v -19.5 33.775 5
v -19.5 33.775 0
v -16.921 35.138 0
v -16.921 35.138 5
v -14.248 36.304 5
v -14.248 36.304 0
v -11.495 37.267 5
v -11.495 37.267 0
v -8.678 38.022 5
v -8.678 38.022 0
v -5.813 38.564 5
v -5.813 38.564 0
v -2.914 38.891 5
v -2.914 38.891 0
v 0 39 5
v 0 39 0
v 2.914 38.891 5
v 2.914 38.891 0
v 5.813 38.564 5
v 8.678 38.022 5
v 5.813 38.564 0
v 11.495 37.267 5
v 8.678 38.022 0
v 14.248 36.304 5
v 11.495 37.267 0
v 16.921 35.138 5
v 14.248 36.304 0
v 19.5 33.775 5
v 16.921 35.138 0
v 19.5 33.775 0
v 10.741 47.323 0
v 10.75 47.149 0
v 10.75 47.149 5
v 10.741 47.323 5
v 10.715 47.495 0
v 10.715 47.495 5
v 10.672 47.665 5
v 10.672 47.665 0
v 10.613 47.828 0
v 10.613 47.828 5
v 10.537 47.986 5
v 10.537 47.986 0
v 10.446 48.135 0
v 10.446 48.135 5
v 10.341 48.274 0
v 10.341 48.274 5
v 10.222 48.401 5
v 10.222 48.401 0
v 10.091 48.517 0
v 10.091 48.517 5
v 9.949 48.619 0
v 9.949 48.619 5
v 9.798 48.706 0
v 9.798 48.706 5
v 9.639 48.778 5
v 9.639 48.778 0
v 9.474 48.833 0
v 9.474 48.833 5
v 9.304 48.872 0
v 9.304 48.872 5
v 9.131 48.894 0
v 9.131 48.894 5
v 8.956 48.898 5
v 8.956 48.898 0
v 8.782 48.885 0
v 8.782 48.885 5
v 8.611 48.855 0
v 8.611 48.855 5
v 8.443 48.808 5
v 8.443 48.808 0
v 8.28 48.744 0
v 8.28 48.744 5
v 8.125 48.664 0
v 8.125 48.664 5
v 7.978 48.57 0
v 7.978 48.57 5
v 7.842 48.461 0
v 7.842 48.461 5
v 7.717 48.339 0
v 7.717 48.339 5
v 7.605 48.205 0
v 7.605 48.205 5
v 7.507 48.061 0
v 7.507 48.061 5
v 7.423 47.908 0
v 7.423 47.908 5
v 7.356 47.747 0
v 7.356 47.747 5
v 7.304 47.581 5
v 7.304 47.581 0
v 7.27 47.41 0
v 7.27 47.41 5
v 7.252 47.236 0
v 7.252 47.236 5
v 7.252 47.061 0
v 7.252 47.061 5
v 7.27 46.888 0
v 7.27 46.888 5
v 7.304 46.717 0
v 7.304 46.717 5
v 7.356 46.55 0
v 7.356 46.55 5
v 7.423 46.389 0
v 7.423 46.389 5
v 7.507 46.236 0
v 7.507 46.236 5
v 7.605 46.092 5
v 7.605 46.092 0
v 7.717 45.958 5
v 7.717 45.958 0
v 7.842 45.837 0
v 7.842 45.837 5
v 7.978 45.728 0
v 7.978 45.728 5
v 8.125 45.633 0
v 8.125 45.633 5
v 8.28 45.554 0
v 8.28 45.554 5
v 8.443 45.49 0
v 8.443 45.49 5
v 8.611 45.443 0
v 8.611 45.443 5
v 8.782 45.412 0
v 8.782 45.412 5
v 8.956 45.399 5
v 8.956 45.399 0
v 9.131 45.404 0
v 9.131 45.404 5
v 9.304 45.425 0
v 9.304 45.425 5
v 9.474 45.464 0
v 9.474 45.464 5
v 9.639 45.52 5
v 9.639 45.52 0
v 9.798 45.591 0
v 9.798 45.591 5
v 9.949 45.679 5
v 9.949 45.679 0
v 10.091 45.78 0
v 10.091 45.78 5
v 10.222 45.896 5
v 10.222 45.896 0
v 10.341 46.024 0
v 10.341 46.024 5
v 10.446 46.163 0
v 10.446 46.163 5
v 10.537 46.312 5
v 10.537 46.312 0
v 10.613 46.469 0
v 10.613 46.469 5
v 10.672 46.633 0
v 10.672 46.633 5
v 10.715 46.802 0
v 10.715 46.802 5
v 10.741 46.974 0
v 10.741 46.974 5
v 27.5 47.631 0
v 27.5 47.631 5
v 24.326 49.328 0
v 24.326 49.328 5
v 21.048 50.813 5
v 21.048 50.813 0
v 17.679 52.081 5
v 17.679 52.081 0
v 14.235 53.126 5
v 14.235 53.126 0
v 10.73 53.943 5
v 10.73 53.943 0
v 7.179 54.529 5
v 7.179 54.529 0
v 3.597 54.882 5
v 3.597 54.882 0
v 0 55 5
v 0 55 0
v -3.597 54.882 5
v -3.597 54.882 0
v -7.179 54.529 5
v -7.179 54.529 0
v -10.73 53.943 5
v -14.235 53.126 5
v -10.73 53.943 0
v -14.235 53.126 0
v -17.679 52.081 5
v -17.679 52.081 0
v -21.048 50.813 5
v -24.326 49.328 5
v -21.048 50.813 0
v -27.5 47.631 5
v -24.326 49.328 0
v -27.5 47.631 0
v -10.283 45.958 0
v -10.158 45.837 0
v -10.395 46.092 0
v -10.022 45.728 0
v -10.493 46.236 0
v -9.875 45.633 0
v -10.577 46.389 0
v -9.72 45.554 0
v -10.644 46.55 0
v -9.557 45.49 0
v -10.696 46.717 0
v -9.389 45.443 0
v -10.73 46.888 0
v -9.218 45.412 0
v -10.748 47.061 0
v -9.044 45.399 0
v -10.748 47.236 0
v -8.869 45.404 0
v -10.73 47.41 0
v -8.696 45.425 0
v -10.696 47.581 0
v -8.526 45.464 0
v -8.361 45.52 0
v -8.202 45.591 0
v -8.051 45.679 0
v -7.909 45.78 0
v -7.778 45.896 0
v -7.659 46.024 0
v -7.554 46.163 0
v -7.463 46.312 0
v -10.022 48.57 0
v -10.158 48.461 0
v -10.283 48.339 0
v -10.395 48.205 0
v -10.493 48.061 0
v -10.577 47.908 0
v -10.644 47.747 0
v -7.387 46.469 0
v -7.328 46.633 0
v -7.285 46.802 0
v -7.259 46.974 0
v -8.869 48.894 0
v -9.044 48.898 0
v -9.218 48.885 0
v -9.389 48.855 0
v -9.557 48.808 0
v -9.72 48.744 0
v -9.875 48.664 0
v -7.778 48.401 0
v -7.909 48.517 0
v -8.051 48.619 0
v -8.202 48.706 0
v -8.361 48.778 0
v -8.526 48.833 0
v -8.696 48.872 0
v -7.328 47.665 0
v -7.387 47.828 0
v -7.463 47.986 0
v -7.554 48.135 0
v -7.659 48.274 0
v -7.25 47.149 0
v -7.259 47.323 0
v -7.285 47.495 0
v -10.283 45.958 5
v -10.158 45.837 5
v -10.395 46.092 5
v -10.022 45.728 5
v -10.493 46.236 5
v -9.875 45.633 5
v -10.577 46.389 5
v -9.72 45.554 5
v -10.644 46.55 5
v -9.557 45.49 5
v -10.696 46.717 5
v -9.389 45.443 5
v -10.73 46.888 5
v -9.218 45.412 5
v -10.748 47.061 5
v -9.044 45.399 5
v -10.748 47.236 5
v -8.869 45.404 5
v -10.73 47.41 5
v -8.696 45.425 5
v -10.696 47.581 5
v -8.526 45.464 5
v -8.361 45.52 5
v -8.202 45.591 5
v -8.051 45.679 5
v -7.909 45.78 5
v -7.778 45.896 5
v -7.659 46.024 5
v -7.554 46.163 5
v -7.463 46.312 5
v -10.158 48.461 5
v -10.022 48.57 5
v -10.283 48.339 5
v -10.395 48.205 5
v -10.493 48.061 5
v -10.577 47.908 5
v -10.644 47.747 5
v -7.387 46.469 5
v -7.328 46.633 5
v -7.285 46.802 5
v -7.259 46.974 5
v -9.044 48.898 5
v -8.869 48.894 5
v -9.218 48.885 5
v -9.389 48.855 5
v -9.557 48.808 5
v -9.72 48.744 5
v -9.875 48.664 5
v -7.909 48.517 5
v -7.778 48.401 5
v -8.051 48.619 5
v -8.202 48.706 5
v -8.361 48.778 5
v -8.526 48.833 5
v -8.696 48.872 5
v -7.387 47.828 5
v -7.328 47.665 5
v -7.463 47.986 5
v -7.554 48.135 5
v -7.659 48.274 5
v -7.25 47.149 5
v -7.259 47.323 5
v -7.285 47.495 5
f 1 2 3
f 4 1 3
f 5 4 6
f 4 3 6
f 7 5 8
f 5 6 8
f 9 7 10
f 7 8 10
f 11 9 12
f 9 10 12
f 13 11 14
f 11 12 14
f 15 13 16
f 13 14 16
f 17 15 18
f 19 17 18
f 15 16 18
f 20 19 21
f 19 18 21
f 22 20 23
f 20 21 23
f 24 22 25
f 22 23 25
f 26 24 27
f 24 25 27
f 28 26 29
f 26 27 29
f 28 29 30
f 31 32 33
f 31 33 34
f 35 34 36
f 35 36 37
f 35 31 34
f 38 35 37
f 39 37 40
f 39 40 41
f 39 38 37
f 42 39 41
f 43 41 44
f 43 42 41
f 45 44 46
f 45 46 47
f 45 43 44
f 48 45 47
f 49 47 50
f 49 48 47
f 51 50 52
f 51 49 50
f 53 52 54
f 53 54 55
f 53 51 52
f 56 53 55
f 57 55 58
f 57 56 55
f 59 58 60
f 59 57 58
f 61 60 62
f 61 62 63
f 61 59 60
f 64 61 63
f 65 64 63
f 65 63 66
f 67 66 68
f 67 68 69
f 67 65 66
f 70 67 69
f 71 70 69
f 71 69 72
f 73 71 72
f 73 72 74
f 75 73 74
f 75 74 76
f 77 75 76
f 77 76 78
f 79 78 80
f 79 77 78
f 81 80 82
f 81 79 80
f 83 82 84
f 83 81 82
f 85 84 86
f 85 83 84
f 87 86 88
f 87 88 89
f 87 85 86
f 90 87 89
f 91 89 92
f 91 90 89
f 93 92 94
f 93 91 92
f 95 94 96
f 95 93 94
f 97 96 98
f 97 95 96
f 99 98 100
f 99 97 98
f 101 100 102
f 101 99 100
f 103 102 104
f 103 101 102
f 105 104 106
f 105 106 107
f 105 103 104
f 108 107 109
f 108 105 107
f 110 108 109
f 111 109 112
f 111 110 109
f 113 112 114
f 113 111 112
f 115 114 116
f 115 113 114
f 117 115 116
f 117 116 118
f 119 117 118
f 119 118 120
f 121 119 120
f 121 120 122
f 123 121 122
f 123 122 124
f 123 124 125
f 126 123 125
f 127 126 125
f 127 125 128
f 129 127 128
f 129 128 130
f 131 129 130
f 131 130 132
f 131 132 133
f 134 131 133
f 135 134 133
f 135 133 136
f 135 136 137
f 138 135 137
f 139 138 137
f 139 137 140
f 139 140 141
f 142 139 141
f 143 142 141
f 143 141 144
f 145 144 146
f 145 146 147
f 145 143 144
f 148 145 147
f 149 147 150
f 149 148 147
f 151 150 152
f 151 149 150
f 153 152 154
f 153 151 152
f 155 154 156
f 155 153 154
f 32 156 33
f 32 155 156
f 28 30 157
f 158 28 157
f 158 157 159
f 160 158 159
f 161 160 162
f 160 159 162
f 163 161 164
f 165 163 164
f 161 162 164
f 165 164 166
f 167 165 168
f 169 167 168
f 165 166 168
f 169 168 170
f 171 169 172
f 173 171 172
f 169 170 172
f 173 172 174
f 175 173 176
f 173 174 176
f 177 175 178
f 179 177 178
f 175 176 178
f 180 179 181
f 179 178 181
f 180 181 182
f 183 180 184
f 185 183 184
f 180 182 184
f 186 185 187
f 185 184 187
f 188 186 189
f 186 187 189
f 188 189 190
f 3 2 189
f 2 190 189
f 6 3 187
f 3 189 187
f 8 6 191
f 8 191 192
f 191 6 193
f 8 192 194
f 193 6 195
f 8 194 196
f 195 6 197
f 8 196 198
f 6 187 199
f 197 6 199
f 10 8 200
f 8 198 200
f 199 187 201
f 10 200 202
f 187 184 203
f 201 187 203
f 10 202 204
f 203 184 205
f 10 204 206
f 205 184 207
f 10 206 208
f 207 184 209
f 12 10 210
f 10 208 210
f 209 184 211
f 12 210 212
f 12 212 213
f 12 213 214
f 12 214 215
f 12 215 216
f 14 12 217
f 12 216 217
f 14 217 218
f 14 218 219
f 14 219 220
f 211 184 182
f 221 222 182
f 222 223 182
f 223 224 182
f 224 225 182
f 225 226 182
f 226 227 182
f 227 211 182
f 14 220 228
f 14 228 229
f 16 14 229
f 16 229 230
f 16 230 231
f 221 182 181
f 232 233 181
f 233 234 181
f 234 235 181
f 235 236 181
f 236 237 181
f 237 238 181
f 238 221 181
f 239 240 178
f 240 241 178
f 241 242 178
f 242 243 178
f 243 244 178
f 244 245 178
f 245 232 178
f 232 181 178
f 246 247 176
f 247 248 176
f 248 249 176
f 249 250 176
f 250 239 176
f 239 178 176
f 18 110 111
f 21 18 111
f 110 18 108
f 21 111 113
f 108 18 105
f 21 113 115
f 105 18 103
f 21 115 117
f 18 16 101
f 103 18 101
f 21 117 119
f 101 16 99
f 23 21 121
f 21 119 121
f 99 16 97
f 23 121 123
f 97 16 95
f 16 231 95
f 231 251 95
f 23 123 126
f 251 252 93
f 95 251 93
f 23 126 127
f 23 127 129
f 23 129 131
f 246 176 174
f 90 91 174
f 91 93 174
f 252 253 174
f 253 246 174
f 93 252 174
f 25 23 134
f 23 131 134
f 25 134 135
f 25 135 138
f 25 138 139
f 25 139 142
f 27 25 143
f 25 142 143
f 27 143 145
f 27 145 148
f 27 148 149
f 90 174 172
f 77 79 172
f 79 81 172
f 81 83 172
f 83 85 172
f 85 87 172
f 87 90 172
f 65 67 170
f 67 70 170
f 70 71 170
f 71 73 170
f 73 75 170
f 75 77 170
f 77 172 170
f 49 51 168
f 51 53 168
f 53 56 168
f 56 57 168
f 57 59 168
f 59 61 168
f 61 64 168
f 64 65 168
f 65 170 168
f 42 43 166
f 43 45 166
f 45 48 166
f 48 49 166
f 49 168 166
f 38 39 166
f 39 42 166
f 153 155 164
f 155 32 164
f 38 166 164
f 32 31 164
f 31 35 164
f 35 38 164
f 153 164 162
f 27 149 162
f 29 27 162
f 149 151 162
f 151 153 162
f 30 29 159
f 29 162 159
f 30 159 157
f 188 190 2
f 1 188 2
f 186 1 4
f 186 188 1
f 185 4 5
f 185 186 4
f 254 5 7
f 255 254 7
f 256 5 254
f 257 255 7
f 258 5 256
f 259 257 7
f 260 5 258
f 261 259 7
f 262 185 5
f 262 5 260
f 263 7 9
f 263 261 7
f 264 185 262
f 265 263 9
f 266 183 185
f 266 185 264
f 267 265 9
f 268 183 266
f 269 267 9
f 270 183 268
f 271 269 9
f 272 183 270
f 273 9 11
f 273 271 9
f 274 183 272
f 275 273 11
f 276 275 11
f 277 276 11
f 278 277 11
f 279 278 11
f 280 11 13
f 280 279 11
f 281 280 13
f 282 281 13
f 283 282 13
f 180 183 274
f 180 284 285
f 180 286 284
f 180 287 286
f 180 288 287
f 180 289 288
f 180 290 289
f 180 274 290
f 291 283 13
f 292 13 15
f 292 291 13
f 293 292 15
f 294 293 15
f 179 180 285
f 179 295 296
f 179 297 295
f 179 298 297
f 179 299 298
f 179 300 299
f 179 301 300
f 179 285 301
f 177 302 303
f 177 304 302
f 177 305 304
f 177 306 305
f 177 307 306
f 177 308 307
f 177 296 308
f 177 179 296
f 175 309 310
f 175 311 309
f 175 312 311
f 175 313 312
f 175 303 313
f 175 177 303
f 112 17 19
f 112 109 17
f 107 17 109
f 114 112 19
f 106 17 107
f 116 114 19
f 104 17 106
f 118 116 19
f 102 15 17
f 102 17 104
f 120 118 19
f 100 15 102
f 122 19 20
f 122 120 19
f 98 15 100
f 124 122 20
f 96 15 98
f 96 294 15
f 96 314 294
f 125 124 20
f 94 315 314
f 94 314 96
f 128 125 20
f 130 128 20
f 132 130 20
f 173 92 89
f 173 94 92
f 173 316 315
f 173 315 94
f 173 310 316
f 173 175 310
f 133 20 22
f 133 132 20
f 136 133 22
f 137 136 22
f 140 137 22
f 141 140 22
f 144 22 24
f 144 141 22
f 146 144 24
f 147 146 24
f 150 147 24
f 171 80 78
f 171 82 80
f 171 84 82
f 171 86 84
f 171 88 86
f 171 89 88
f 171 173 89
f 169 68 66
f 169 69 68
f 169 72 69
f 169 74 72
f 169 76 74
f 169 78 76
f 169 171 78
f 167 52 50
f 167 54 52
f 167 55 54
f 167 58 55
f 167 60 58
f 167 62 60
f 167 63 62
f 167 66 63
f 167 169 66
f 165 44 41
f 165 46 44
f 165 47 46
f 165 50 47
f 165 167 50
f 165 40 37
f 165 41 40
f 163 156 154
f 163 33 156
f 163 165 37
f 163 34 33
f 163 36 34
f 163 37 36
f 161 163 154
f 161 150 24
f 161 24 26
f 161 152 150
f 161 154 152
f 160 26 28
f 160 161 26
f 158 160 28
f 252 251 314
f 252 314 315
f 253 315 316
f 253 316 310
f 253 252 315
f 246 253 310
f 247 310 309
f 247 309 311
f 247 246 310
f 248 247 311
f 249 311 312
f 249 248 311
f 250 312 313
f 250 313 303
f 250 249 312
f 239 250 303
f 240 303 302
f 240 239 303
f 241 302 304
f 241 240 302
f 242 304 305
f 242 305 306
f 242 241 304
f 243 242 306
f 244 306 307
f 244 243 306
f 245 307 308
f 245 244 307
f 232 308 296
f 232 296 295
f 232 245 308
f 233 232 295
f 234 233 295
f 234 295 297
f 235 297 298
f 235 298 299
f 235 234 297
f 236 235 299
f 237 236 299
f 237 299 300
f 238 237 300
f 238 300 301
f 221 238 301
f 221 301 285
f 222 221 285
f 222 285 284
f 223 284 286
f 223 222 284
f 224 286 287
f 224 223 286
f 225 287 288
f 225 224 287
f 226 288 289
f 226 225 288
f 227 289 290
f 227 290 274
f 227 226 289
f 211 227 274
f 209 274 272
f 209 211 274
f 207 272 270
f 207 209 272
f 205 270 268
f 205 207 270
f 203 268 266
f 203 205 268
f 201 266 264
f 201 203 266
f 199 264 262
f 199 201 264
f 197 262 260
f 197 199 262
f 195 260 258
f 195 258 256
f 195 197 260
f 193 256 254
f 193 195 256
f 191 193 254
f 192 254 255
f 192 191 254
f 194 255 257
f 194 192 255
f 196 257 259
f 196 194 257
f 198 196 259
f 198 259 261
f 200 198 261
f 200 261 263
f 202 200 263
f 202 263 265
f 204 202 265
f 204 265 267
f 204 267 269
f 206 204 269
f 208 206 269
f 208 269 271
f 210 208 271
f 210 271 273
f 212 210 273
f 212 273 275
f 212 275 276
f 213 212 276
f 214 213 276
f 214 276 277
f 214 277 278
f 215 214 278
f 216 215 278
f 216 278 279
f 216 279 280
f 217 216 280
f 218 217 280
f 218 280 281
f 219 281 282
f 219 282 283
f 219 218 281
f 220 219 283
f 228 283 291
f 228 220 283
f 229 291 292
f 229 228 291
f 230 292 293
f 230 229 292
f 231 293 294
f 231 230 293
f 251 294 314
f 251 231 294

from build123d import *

# Parameters (mm, degrees)
ESQUISSE2_R             = 1.75
BOSS_EXTRU_1_DEPTH      = 5
ESQUISSE3_R             = 39
ENL_V_MAT_EXTRU_1_DEPTH = 6


with BuildPart() as part:
    # Esquisse2 → Boss.-Extru.1 (new body)
    with BuildSketch(Plane.XY):
        with BuildLine():
            Line((0, 0), (27.5, 47.631397208))
            ThreePointArc((27.5, 47.631397208), (0, 55), (-27.5, 47.631397208))
            Line((-27.5, 47.631397208), (0, 0))
        make_face()
        with Locations((-9, 47.148700937)):
            Circle(ESQUISSE2_R, mode=Mode.SUBTRACT)
        with Locations((9, 47.148700937)):
            Circle(ESQUISSE2_R, mode=Mode.SUBTRACT)
    extrude(amount=BOSS_EXTRU_1_DEPTH)

    # Esquisse3 → Enlèv. mat.-Extru.1 (cut, through all)
    with BuildSketch(Plane(origin=(0, 0, 0), x_dir=(-1, 0, 0), z_dir=(0, 0, -1))):
        Circle(ESQUISSE3_R)
    extrude(amount=-ENL_V_MAT_EXTRU_1_DEPTH, mode=Mode.SUBTRACT)


solid = part.part
